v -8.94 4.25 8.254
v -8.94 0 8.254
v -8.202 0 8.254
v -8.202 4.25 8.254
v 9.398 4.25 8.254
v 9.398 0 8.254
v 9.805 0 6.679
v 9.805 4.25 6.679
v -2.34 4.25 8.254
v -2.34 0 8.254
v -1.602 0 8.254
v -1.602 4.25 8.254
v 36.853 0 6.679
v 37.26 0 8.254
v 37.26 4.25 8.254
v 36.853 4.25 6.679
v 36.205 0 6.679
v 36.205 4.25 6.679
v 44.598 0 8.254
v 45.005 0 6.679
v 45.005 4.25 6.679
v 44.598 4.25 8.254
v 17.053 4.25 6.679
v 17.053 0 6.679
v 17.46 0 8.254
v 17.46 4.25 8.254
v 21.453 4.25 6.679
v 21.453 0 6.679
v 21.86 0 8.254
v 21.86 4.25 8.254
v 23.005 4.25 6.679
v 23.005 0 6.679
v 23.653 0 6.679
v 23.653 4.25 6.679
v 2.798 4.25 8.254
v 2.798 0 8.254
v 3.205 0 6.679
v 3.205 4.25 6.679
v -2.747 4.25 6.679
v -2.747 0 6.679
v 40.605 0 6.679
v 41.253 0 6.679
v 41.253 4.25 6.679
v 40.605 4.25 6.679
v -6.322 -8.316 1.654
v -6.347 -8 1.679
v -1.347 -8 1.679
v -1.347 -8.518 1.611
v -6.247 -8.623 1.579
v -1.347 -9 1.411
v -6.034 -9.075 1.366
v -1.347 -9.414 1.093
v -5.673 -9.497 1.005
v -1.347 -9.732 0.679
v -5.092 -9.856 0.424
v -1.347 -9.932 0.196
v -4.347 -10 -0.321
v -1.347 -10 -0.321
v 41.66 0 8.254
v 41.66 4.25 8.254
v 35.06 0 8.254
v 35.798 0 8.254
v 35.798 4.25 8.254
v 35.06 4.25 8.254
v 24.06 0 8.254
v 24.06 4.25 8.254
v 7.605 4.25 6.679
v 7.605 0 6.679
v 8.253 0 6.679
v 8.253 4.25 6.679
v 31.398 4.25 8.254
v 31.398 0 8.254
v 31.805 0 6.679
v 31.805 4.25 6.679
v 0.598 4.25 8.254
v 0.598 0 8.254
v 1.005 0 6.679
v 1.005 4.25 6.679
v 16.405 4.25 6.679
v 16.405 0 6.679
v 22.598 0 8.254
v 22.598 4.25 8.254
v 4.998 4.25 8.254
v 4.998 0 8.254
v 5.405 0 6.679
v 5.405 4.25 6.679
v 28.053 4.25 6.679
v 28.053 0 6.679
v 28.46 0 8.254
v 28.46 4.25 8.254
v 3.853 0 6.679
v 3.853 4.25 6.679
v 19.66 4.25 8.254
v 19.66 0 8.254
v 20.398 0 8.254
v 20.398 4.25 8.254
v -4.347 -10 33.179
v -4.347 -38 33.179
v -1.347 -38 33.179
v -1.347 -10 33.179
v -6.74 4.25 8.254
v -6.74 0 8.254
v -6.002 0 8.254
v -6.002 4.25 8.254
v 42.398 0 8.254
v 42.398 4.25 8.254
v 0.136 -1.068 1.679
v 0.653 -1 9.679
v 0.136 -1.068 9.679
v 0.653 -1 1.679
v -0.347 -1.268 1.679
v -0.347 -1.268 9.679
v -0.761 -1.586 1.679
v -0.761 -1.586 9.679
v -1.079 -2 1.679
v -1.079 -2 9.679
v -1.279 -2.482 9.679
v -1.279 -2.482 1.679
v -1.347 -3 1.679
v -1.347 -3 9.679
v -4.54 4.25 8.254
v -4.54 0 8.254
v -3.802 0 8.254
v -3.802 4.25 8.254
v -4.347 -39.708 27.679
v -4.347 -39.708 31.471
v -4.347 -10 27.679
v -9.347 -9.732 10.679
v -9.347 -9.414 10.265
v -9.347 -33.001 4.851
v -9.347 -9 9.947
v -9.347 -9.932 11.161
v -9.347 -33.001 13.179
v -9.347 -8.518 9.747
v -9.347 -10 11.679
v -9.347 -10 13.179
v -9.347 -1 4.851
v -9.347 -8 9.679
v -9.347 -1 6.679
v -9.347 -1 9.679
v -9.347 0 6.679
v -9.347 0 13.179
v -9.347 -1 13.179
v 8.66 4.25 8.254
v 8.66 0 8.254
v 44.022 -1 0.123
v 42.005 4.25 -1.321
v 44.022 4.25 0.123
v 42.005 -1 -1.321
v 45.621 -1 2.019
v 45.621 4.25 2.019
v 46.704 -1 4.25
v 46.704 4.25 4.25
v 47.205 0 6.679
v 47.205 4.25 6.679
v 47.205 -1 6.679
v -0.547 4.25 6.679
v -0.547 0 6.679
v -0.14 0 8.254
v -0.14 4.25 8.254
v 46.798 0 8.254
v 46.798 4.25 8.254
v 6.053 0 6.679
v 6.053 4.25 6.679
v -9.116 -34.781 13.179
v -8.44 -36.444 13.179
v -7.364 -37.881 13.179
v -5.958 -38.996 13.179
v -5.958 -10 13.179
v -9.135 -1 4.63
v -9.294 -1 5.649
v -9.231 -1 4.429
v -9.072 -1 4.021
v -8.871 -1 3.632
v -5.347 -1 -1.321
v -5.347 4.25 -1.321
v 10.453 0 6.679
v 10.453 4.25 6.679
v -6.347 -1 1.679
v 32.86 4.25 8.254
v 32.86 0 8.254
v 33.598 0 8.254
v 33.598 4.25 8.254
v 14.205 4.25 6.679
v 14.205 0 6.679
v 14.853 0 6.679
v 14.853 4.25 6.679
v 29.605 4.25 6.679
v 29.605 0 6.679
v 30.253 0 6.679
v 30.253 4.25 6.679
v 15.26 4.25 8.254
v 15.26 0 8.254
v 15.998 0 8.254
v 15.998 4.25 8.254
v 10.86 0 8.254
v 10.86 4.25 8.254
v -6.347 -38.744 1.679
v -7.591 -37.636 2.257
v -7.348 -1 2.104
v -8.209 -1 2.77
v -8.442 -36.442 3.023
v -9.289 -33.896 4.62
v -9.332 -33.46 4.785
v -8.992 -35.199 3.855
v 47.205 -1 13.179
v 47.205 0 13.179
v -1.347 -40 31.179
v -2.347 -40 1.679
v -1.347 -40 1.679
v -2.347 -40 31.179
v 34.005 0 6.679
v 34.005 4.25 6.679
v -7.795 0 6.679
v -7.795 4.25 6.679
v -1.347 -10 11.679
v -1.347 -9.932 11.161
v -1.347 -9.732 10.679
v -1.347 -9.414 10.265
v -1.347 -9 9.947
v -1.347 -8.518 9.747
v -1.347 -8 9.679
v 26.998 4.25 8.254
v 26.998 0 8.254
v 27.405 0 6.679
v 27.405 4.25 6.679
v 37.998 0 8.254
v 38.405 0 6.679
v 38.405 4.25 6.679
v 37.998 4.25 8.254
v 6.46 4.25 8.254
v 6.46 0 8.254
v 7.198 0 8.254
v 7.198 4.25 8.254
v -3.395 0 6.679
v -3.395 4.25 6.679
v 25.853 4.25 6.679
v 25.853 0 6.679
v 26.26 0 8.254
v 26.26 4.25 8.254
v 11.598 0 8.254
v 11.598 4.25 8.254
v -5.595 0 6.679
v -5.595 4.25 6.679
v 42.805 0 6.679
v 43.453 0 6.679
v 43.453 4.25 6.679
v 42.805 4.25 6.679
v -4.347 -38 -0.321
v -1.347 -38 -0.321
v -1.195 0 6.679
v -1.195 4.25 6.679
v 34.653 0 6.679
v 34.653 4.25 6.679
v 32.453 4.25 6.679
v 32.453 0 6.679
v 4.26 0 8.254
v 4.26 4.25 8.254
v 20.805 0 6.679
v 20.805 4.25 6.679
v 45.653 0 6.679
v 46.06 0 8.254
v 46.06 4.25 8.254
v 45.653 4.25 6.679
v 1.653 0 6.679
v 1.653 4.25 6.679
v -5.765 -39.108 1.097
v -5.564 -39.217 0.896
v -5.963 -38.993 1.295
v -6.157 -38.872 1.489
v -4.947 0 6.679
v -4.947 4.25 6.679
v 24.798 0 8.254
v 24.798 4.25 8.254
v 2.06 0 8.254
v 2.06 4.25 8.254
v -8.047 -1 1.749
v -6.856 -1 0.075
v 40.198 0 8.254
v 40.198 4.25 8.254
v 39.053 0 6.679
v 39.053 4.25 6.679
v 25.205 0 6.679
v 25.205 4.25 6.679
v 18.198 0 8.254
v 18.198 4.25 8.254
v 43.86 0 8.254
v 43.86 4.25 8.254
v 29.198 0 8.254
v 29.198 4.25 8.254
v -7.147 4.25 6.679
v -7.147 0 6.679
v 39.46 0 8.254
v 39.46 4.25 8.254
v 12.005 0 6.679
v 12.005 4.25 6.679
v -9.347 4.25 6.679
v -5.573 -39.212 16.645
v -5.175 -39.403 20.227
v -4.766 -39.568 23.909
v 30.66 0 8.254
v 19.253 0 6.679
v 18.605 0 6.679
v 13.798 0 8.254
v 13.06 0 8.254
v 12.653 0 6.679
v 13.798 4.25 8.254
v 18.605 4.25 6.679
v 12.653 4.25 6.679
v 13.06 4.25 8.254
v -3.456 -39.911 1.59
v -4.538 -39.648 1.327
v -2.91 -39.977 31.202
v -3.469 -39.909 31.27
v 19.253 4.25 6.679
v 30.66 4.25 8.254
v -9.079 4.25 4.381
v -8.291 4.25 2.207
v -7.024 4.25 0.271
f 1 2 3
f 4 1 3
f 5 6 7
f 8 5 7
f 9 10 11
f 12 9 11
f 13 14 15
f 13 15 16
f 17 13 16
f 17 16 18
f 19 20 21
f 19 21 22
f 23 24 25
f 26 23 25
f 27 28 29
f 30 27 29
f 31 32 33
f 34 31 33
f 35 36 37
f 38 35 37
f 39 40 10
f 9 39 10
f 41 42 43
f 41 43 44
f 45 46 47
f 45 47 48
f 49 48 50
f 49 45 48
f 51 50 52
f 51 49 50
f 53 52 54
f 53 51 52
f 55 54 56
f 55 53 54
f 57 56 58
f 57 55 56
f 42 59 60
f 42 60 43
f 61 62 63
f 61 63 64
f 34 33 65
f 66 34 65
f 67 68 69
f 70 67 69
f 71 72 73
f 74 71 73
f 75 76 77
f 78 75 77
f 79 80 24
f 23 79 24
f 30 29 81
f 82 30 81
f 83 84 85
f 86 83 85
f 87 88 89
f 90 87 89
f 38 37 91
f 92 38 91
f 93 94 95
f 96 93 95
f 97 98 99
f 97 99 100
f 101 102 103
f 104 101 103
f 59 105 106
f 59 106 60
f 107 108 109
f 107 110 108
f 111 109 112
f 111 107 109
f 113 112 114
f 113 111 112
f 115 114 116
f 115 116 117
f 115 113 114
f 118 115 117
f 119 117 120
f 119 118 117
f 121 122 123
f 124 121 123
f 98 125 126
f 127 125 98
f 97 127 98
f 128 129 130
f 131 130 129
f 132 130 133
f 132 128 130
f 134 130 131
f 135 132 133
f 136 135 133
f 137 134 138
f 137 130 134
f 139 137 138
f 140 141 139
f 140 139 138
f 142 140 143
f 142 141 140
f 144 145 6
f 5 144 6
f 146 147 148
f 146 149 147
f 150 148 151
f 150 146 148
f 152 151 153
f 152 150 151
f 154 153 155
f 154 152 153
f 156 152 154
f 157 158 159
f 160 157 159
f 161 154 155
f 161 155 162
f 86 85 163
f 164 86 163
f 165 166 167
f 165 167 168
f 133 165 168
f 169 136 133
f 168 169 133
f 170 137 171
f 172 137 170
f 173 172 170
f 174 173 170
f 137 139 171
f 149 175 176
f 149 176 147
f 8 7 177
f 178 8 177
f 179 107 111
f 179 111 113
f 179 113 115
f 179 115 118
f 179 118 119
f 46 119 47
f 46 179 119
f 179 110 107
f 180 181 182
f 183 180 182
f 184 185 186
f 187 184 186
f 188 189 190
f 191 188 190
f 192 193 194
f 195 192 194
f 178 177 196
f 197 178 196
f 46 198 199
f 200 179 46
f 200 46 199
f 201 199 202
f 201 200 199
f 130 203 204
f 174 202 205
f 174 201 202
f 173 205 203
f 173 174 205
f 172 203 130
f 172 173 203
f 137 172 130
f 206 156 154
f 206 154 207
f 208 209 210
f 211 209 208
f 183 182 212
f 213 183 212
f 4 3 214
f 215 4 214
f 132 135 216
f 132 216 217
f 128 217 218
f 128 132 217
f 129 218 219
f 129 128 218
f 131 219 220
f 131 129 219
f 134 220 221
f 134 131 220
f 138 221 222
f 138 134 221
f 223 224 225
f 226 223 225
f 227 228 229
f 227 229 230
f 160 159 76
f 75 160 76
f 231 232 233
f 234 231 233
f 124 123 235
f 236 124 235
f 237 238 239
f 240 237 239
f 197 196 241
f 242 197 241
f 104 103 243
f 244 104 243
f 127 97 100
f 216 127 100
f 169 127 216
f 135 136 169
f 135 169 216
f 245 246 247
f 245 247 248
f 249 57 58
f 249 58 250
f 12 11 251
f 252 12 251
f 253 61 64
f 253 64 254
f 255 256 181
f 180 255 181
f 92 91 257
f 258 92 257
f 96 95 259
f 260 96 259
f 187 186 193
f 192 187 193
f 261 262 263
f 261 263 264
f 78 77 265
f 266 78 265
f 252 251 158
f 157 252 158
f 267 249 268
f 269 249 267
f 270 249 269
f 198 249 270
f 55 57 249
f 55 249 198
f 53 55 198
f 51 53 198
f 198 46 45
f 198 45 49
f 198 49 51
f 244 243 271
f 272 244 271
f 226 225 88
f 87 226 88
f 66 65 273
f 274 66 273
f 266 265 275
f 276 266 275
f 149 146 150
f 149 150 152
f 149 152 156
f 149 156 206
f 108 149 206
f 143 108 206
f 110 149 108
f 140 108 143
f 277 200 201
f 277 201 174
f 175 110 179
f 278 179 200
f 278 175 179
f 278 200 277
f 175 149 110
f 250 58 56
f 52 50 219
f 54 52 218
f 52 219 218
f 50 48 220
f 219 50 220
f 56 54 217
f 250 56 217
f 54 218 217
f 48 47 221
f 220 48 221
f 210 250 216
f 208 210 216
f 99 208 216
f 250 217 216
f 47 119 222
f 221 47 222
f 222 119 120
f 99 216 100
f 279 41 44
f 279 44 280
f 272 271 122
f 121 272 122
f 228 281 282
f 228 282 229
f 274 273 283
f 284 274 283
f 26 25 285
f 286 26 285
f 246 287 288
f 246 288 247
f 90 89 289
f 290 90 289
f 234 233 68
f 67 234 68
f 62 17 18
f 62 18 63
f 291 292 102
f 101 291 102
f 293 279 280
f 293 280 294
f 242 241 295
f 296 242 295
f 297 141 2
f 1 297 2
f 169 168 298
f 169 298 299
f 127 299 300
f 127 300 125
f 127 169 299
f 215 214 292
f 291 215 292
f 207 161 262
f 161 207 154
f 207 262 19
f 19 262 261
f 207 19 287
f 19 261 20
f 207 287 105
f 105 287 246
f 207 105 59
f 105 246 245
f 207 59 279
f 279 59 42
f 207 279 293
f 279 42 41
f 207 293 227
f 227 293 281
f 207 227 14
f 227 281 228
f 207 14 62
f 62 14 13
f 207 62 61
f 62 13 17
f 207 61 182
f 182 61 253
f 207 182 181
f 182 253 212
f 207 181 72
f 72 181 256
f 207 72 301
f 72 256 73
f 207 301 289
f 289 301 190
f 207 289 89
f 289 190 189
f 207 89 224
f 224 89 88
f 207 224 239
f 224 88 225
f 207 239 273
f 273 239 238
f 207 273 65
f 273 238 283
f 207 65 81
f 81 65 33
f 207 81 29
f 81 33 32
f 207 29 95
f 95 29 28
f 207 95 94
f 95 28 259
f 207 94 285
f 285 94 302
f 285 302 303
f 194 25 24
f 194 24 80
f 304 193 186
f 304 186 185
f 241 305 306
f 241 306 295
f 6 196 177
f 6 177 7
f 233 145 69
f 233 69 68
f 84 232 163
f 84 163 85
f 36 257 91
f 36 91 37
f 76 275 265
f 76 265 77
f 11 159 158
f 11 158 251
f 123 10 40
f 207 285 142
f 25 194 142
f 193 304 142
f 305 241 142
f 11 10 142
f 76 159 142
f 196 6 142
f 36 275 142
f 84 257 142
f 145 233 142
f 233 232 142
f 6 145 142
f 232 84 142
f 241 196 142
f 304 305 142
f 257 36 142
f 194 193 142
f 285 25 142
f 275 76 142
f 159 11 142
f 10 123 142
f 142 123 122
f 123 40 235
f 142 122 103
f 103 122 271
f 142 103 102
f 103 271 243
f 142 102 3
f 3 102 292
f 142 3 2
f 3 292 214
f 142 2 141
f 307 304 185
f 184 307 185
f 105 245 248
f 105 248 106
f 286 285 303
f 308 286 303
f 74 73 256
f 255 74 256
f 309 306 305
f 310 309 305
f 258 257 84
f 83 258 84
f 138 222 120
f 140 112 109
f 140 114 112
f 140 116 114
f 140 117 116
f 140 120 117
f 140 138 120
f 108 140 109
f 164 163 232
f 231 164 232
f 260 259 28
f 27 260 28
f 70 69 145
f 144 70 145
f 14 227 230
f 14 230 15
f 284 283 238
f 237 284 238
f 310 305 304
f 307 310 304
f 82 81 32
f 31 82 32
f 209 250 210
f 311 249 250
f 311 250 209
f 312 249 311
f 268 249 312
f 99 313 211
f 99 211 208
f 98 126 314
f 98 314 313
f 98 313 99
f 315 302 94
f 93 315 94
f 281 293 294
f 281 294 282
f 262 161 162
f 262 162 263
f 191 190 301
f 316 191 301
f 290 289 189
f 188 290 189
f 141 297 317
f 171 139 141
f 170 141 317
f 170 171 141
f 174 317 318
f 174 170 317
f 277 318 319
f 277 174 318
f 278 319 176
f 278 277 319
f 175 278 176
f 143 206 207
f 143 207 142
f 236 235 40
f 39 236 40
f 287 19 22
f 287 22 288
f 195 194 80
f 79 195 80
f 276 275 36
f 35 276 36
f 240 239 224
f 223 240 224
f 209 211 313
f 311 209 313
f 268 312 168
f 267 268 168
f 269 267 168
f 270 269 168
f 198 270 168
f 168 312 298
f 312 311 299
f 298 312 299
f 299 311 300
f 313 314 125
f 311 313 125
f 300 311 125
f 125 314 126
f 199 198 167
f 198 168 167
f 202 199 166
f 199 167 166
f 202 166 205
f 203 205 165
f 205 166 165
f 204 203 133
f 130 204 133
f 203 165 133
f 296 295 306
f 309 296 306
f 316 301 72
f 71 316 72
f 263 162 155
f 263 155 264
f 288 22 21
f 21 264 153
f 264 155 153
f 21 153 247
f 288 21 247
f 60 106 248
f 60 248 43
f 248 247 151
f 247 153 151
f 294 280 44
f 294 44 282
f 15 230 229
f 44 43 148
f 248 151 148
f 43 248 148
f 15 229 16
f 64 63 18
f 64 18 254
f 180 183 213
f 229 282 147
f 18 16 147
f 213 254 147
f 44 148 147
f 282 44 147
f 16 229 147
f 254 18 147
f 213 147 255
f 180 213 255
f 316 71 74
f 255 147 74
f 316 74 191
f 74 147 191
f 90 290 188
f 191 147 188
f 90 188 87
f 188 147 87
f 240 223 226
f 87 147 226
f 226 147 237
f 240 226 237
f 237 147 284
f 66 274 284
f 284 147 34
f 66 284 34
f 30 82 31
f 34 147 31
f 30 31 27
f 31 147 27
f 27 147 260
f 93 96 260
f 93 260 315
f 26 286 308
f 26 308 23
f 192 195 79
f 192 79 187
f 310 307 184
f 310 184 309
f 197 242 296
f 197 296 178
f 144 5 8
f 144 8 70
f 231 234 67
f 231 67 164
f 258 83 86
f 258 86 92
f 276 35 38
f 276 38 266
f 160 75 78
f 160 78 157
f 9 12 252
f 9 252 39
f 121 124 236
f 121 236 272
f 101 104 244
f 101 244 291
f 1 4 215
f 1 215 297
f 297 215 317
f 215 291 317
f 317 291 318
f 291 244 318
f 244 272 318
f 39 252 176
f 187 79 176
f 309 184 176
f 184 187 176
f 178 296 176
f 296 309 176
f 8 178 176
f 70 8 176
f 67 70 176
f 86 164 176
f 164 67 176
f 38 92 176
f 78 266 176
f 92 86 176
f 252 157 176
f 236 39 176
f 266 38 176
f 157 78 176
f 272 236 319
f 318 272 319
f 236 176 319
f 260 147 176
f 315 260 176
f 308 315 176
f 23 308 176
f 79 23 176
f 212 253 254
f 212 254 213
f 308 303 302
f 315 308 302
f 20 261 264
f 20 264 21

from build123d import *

# Parameters (mm, degrees)
BOSS_EXTRUDE1_DEPTH = 4.25
BOSS_EXTRUDE2_START = -1
BOSS_EXTRUDE2_DEPTH = 1
BOSS_EXTRUDE3_DEPTH = 8
CUT_EXTRUDE2_DEPTH  = 63.822057505
CUT_EXTRUDE4_START  = -39.000000805
CUT_EXTRUDE4_DEPTH  = 38.707889695
BOSS_EXTRUDE5_START = -1
BOSS_EXTRUDE5_DEPTH = 1
BOSS_EXTRUDE6_DEPTH = 4.25
FILLET1_R           = 2


# Read off the part's stored shape, not the designer's step: Cut-Extrude4
with BuildPart() as part:
    # Sketch1 → Boss-Extrude1 (new body)
    with BuildSketch(Plane(origin=(0, 0, 0), x_dir=(1, 0, 0), z_dir=(0, 1, 0))):
        with BuildLine():
            Line((33.597981706, -8.253844427), (34.005304366, -6.678843843))
            ThreePointArc((34.005304366, -6.678843843), (32.949576248, -2.206707665), (30.005304176, 1.321156537))
            Line((30.005304176, 1.321156537), (-5.346833689, 1.321156537))
            ThreePointArc((-5.346833689, 1.321156537), (-8.291105761, -2.206707665), (-9.346833879, -6.678843843))
            Line((-9.346833879, -6.678843843), (-8.939511162, -8.253844427))
            Line((-8.939511162, -8.253844427), (-8.202018294, -8.253844427))
            Line((-8.202018294, -8.253844427), (-7.794695634, -6.678843843))
            Line((-7.794695634, -6.678843843), (-7.146833879, -6.678843843))
            Line((-7.146833879, -6.678843843), (-6.739511162, -8.253844427))
            Line((-6.739511162, -8.253844427), (-6.002018294, -8.253844427))
            Line((-6.002018294, -8.253844427), (-5.594695634, -6.678843843))
            Line((-5.594695634, -6.678843843), (-4.946833879, -6.678843843))
            Line((-4.946833879, -6.678843843), (-4.539511162, -8.253844427))
            Line((-4.539511162, -8.253844427), (-3.802018294, -8.253844427))
            Line((-3.802018294, -8.253844427), (-3.394695634, -6.678843843))
            Line((-3.394695634, -6.678843843), (-2.746833879, -6.678843843))
            Line((-2.746833879, -6.678843843), (-2.339511162, -8.253844427))
            Line((-2.339511162, -8.253844427), (-1.602018294, -8.253844427))
            Line((-1.602018294, -8.253844427), (-1.194695634, -6.678843843))
            Line((-1.194695634, -6.678843843), (-0.546833879, -6.678843843))
            Line((-0.546833879, -6.678843843), (-0.139511162, -8.253844427))
            Line((-0.139511162, -8.253844427), (0.597981706, -8.253844427))
            Line((0.597981706, -8.253844427), (1.005304366, -6.678843843))
            Line((1.005304366, -6.678843843), (1.653166121, -6.678843843))
            Line((1.653166121, -6.678843843), (2.060488838, -8.253844427))
            Line((2.060488838, -8.253844427), (2.797981706, -8.253844427))
            Line((2.797981706, -8.253844427), (3.205304366, -6.678843843))
            Line((3.205304366, -6.678843843), (3.853166121, -6.678843843))
            Line((3.853166121, -6.678843843), (4.260488838, -8.253844427))
            Line((4.260488838, -8.253844427), (4.997981706, -8.253844427))
            Line((4.997981706, -8.253844427), (5.405304366, -6.678843843))
            Line((5.405304366, -6.678843843), (6.053166121, -6.678843843))
            Line((6.053166121, -6.678843843), (6.460488838, -8.253844427))
            Line((6.460488838, -8.253844427), (7.197981706, -8.253844427))
            Line((7.197981706, -8.253844427), (7.605304366, -6.678843843))
            Line((7.605304366, -6.678843843), (8.253166121, -6.678843843))
            Line((8.253166121, -6.678843843), (8.660488838, -8.253844427))
            Line((8.660488838, -8.253844427), (9.397981706, -8.253844427))
            Line((9.397981706, -8.253844427), (9.805304366, -6.678843843))
            Line((9.805304366, -6.678843843), (10.453166121, -6.678843843))
            Line((10.453166121, -6.678843843), (10.860488838, -8.253844427))
            Line((10.860488838, -8.253844427), (11.597981706, -8.253844427))
            Line((11.597981706, -8.253844427), (12.005304366, -6.678843843))
            Line((12.005304366, -6.678843843), (12.653166121, -6.678843843))
            Line((12.653166121, -6.678843843), (13.060488838, -8.253844427))
            Line((13.060488838, -8.253844427), (13.797981706, -8.253844427))
            Line((13.797981706, -8.253844427), (14.205304366, -6.678843843))
            Line((14.205304366, -6.678843843), (14.853166121, -6.678843843))
            Line((14.853166121, -6.678843843), (15.260488838, -8.253844427))
            Line((15.260488838, -8.253844427), (15.997981706, -8.253844427))
            Line((15.997981706, -8.253844427), (16.405304366, -6.678843843))
            Line((16.405304366, -6.678843843), (17.053166121, -6.678843843))
            Line((17.053166121, -6.678843843), (17.460488838, -8.253844427))
            Line((17.460488838, -8.253844427), (18.197981706, -8.253844427))
            Line((18.197981706, -8.253844427), (18.605304366, -6.678843843))
            Line((18.605304366, -6.678843843), (19.253166121, -6.678843843))
            Line((19.253166121, -6.678843843), (19.660488838, -8.253844427))
            Line((19.660488838, -8.253844427), (20.397981706, -8.253844427))
            Line((20.397981706, -8.253844427), (20.805304366, -6.678843843))
            Line((20.805304366, -6.678843843), (21.453166121, -6.678843843))
            Line((21.453166121, -6.678843843), (21.860488838, -8.253844427))
            Line((21.860488838, -8.253844427), (22.597981706, -8.253844427))
            Line((22.597981706, -8.253844427), (23.005304366, -6.678843843))
            Line((23.005304366, -6.678843843), (23.653166121, -6.678843843))
            Line((23.653166121, -6.678843843), (24.060488838, -8.253844427))
            Line((24.060488838, -8.253844427), (24.797981706, -8.253844427))
            Line((24.797981706, -8.253844427), (25.205304366, -6.678843843))
            Line((25.205304366, -6.678843843), (25.853166121, -6.678843843))
            Line((25.853166121, -6.678843843), (26.260488838, -8.253844427))
            Line((26.260488838, -8.253844427), (26.997981706, -8.253844427))
            Line((26.997981706, -8.253844427), (27.405304366, -6.678843843))
            Line((27.405304366, -6.678843843), (28.053166121, -6.678843843))
            Line((28.053166121, -6.678843843), (28.460488838, -8.253844427))
            Line((28.460488838, -8.253844427), (29.197981706, -8.253844427))
            Line((29.197981706, -8.253844427), (29.605304366, -6.678843843))
            Line((29.605304366, -6.678843843), (30.253166121, -6.678843843))
            Line((30.253166121, -6.678843843), (30.660488838, -8.253844427))
            Line((30.660488838, -8.253844427), (31.397981706, -8.253844427))
            Line((31.397981706, -8.253844427), (31.805304366, -6.678843843))
            Line((31.805304366, -6.678843843), (32.453166121, -6.678843843))
            Line((32.453166121, -6.678843843), (32.860488838, -8.253844427))
            Line((32.860488838, -8.253844427), (33.597981706, -8.253844427))
        make_face()
    extrude(amount=BOSS_EXTRUDE1_DEPTH)

    # Sketch1<3> → Boss-Extrude2 (add)
    with BuildSketch(Plane(origin=(0, 0, 0), x_dir=(1, 0, 0), z_dir=(0, 1, 0)).offset(BOSS_EXTRUDE2_START)):
        with BuildLine():
            Line((34.005304366, -6.678843843), (34.005304366, -13.178843977))
            Line((34.005304366, -13.178843977), (-9.346833879, -13.178843977))
            Line((-9.346833879, -13.178843977), (-9.346833879, -6.678843843))
            ThreePointArc((-9.346833879, -6.678843843), (-8.291105761, -2.206707665), (-5.346833689, 1.321156537))
            Line((-5.346833689, 1.321156537), (30.005304176, 1.321156537))
            ThreePointArc((30.005304176, 1.321156537), (32.949576248, -2.206707665), (34.005304366, -6.678843843))
        make_face()
    extrude(amount=BOSS_EXTRUDE2_DEPTH)

    # Sketch2 → Boss-Extrude3 (add)
    with BuildSketch(Plane.ZY.offset(9.346833879)):
        with BuildLine():
            Line((-0.321155635, -9.999999776), (-0.321155635, -38.000000477))
            Line((-0.321155635, -38.000000477), (1.678844693, -40.000000805))
            Line((1.678844693, -40.000000805), (31.178844871, -40.000000805))
            Line((31.178844871, -40.000000805), (33.178845199, -38.000000477))
            Line((33.178845199, -38.000000477), (33.178845199, -9.999999613))
            Line((33.178845199, -9.999999613), (11.678843977, -9.999999613))
            ThreePointArc((11.678843977, -9.999999613), (10.264630415, -9.414213175), (9.678843977, -7.999999613))
            Line((9.678843977, -7.999999613), (9.678843977, -1))
            Line((9.678843977, -1), (6.678843843, -1))
            Line((6.678843843, -1), (1.678844529, -1))
            Line((1.678844529, -1), (1.678844529, -7.999999613))
            ThreePointArc((1.678844529, -7.999999613), (1.093058043, -9.414213291), (-0.321155635, -9.999999776))
        make_face()
    extrude(amount=-BOSS_EXTRUDE3_DEPTH)

    # Sketch3 → Cut-Extrude2 (cut, through all)
    with BuildSketch(Plane.XY.offset(33.178845199)):
        with BuildLine():
            ThreePointArc((-2.346834043, -40.000000805), (-7.296219092, -37.949386296), (-9.346834259, -33.00000152))
            Line((-9.346834259, -33.00000152), (-9.346834259, -40.000000805))
            Line((-9.346834259, -40.000000805), (-2.346834043, -40.000000805))
        make_face()
    extrude(amount=-CUT_EXTRUDE2_DEPTH, mode=Mode.SUBTRACT)

    # Cut-Extrude4 outline → Cut-Extrude4 (cut)
    with BuildSketch(Plane.XZ.offset(40.000000805).offset(CUT_EXTRUDE4_START)):
        with BuildLine():
            ThreePointArc((-6.346834233, 1.678844693), (-8.286187836, 2.849531896), (-9.346844813, 4.85118314))
            Line((-9.346844813, 4.85118314), (-9.346833879, 1.678844529))
            Line((-9.346833879, 1.678844529), (-6.346834233, 1.678844693))
        make_face()
        Polygon((-9.346834259, 13.178845646), (-5.957945227, 13.178845646), (-4.346834371, 27.678845229), (-4.346834371, 33.178845199), (-9.346833879, 33.178845199), align=None)
        Polygon((-4.346834371, -0.321155635), (-6.346834233, 1.678844693), (-9.346833879, 1.678844529), (-9.346833879, -0.321155635), align=None)
    extrude(amount=CUT_EXTRUDE4_DEPTH, mode=Mode.SUBTRACT)

    # Sketch5 → Boss-Extrude5 (add)
    with BuildSketch(Plane(origin=(0, 0, 0), x_dir=(1, 0, 0), z_dir=(0, 1, 0)).offset(BOSS_EXTRUDE5_START)):
        with BuildLine():
            Line((47.205304366, -6.678843843), (46.797981706, -8.253844427))
            Line((46.797981706, -8.253844427), (46.060488838, -8.253844427))
            Line((46.060488838, -8.253844427), (45.653166121, -6.678843843))
            Line((45.653166121, -6.678843843), (45.005304366, -6.678843843))
            Line((45.005304366, -6.678843843), (44.597981706, -8.253844427))
            Line((44.597981706, -8.253844427), (43.860488838, -8.253844427))
            Line((43.860488838, -8.253844427), (43.453166121, -6.678843843))
            Line((43.453166121, -6.678843843), (42.805304366, -6.678843843))
            Line((42.805304366, -6.678843843), (42.397981706, -8.253844427))
            Line((42.397981706, -8.253844427), (41.660488838, -8.253844427))
            Line((41.660488838, -8.253844427), (41.253166121, -6.678843843))
            Line((41.253166121, -6.678843843), (40.605304366, -6.678843843))
            Line((40.605304366, -6.678843843), (40.197981706, -8.253844427))
            Line((40.197981706, -8.253844427), (39.460488838, -8.253844427))
            Line((39.460488838, -8.253844427), (39.053166121, -6.678843843))
            Line((39.053166121, -6.678843843), (38.405304366, -6.678843843))
            Line((38.405304366, -6.678843843), (37.997981706, -8.253844427))
            Line((37.997981706, -8.253844427), (37.260488838, -8.253844427))
            Line((37.260488838, -8.253844427), (36.853166121, -6.678843843))
            Line((36.853166121, -6.678843843), (36.205304366, -6.678843843))
            Line((36.205304366, -6.678843843), (35.797981706, -8.253844427))
            Line((35.797981706, -8.253844427), (35.060488838, -8.253844427))
            Line((35.060488838, -8.253844427), (34.653166121, -6.678843843))
            Line((34.653166121, -6.678843843), (34.005304366, -6.678843843))
            ThreePointArc((34.005304366, -6.678843843), (32.949576248, -2.206707665), (30.005304176, 1.321156537))
            Line((30.005304176, 1.321156537), (42.005304176, 1.321156537))
            ThreePointArc((42.005304176, 1.321156537), (45.620970607, -2.018660542), (47.205304366, -6.678843843))
        make_face()
        Polygon((45.005304366, -6.678843843), (45.653166121, -6.678843843), (46.060488838, -8.253844427), (46.797981706, -8.253844427), (47.205304366, -6.678843843), (47.205304366, -13.178843977), (34.005304366, -13.178843977), (34.005304366, -6.678843843), (34.653166121, -6.678843843), (35.060488838, -8.253844427), (35.797981706, -8.253844427), (36.205304366, -6.678843843), (36.853166121, -6.678843843), (37.260488838, -8.253844427), (37.997981706, -8.253844427), (38.405304366, -6.678843843), (39.053166121, -6.678843843), (39.460488838, -8.253844427), (40.197981706, -8.253844427), (40.605304366, -6.678843843), (41.253166121, -6.678843843), (41.660488838, -8.253844427), (42.397981706, -8.253844427), (42.805304366, -6.678843843), (43.453166121, -6.678843843), (43.860488838, -8.253844427), (44.597981706, -8.253844427), align=None)
    extrude(amount=BOSS_EXTRUDE5_DEPTH)

    # Sketch5<3> → Boss-Extrude6 (add)
    with BuildSketch(Plane(origin=(0, 0, 0), x_dir=(1, 0, 0), z_dir=(0, 1, 0))):
        with BuildLine():
            Line((47.205304366, -6.678843843), (46.797981706, -8.253844427))
            Line((46.797981706, -8.253844427), (46.060488838, -8.253844427))
            Line((46.060488838, -8.253844427), (45.653166121, -6.678843843))
            Line((45.653166121, -6.678843843), (45.005304366, -6.678843843))
            Line((45.005304366, -6.678843843), (44.597981706, -8.253844427))
            Line((44.597981706, -8.253844427), (43.860488838, -8.253844427))
            Line((43.860488838, -8.253844427), (43.453166121, -6.678843843))
            Line((43.453166121, -6.678843843), (42.805304366, -6.678843843))
            Line((42.805304366, -6.678843843), (42.397981706, -8.253844427))
            Line((42.397981706, -8.253844427), (41.660488838, -8.253844427))
            Line((41.660488838, -8.253844427), (41.253166121, -6.678843843))
            Line((41.253166121, -6.678843843), (40.605304366, -6.678843843))
            Line((40.605304366, -6.678843843), (40.197981706, -8.253844427))
            Line((40.197981706, -8.253844427), (39.460488838, -8.253844427))
            Line((39.460488838, -8.253844427), (39.053166121, -6.678843843))
            Line((39.053166121, -6.678843843), (38.405304366, -6.678843843))
            Line((38.405304366, -6.678843843), (37.997981706, -8.253844427))
            Line((37.997981706, -8.253844427), (37.260488838, -8.253844427))
            Line((37.260488838, -8.253844427), (36.853166121, -6.678843843))
            Line((36.853166121, -6.678843843), (36.205304366, -6.678843843))
            Line((36.205304366, -6.678843843), (35.797981706, -8.253844427))
            Line((35.797981706, -8.253844427), (35.060488838, -8.253844427))
            Line((35.060488838, -8.253844427), (34.653166121, -6.678843843))
            Line((34.653166121, -6.678843843), (34.005304366, -6.678843843))
            ThreePointArc((34.005304366, -6.678843843), (32.949576248, -2.206707665), (30.005304176, 1.321156537))
            Line((30.005304176, 1.321156537), (42.005304176, 1.321156537))
            ThreePointArc((42.005304176, 1.321156537), (45.620970607, -2.018660542), (47.205304366, -6.678843843))
        make_face()
    extrude(amount=BOSS_EXTRUDE6_DEPTH)

    # Fillet1
    fillet1_edges = [part.edges().sort_by_distance(p)[0] for p in [
        (-1.346833879, -1, 5.678844253),
    ]]
    fillet(fillet1_edges, radius=FILLET1_R)


solid = part.part
